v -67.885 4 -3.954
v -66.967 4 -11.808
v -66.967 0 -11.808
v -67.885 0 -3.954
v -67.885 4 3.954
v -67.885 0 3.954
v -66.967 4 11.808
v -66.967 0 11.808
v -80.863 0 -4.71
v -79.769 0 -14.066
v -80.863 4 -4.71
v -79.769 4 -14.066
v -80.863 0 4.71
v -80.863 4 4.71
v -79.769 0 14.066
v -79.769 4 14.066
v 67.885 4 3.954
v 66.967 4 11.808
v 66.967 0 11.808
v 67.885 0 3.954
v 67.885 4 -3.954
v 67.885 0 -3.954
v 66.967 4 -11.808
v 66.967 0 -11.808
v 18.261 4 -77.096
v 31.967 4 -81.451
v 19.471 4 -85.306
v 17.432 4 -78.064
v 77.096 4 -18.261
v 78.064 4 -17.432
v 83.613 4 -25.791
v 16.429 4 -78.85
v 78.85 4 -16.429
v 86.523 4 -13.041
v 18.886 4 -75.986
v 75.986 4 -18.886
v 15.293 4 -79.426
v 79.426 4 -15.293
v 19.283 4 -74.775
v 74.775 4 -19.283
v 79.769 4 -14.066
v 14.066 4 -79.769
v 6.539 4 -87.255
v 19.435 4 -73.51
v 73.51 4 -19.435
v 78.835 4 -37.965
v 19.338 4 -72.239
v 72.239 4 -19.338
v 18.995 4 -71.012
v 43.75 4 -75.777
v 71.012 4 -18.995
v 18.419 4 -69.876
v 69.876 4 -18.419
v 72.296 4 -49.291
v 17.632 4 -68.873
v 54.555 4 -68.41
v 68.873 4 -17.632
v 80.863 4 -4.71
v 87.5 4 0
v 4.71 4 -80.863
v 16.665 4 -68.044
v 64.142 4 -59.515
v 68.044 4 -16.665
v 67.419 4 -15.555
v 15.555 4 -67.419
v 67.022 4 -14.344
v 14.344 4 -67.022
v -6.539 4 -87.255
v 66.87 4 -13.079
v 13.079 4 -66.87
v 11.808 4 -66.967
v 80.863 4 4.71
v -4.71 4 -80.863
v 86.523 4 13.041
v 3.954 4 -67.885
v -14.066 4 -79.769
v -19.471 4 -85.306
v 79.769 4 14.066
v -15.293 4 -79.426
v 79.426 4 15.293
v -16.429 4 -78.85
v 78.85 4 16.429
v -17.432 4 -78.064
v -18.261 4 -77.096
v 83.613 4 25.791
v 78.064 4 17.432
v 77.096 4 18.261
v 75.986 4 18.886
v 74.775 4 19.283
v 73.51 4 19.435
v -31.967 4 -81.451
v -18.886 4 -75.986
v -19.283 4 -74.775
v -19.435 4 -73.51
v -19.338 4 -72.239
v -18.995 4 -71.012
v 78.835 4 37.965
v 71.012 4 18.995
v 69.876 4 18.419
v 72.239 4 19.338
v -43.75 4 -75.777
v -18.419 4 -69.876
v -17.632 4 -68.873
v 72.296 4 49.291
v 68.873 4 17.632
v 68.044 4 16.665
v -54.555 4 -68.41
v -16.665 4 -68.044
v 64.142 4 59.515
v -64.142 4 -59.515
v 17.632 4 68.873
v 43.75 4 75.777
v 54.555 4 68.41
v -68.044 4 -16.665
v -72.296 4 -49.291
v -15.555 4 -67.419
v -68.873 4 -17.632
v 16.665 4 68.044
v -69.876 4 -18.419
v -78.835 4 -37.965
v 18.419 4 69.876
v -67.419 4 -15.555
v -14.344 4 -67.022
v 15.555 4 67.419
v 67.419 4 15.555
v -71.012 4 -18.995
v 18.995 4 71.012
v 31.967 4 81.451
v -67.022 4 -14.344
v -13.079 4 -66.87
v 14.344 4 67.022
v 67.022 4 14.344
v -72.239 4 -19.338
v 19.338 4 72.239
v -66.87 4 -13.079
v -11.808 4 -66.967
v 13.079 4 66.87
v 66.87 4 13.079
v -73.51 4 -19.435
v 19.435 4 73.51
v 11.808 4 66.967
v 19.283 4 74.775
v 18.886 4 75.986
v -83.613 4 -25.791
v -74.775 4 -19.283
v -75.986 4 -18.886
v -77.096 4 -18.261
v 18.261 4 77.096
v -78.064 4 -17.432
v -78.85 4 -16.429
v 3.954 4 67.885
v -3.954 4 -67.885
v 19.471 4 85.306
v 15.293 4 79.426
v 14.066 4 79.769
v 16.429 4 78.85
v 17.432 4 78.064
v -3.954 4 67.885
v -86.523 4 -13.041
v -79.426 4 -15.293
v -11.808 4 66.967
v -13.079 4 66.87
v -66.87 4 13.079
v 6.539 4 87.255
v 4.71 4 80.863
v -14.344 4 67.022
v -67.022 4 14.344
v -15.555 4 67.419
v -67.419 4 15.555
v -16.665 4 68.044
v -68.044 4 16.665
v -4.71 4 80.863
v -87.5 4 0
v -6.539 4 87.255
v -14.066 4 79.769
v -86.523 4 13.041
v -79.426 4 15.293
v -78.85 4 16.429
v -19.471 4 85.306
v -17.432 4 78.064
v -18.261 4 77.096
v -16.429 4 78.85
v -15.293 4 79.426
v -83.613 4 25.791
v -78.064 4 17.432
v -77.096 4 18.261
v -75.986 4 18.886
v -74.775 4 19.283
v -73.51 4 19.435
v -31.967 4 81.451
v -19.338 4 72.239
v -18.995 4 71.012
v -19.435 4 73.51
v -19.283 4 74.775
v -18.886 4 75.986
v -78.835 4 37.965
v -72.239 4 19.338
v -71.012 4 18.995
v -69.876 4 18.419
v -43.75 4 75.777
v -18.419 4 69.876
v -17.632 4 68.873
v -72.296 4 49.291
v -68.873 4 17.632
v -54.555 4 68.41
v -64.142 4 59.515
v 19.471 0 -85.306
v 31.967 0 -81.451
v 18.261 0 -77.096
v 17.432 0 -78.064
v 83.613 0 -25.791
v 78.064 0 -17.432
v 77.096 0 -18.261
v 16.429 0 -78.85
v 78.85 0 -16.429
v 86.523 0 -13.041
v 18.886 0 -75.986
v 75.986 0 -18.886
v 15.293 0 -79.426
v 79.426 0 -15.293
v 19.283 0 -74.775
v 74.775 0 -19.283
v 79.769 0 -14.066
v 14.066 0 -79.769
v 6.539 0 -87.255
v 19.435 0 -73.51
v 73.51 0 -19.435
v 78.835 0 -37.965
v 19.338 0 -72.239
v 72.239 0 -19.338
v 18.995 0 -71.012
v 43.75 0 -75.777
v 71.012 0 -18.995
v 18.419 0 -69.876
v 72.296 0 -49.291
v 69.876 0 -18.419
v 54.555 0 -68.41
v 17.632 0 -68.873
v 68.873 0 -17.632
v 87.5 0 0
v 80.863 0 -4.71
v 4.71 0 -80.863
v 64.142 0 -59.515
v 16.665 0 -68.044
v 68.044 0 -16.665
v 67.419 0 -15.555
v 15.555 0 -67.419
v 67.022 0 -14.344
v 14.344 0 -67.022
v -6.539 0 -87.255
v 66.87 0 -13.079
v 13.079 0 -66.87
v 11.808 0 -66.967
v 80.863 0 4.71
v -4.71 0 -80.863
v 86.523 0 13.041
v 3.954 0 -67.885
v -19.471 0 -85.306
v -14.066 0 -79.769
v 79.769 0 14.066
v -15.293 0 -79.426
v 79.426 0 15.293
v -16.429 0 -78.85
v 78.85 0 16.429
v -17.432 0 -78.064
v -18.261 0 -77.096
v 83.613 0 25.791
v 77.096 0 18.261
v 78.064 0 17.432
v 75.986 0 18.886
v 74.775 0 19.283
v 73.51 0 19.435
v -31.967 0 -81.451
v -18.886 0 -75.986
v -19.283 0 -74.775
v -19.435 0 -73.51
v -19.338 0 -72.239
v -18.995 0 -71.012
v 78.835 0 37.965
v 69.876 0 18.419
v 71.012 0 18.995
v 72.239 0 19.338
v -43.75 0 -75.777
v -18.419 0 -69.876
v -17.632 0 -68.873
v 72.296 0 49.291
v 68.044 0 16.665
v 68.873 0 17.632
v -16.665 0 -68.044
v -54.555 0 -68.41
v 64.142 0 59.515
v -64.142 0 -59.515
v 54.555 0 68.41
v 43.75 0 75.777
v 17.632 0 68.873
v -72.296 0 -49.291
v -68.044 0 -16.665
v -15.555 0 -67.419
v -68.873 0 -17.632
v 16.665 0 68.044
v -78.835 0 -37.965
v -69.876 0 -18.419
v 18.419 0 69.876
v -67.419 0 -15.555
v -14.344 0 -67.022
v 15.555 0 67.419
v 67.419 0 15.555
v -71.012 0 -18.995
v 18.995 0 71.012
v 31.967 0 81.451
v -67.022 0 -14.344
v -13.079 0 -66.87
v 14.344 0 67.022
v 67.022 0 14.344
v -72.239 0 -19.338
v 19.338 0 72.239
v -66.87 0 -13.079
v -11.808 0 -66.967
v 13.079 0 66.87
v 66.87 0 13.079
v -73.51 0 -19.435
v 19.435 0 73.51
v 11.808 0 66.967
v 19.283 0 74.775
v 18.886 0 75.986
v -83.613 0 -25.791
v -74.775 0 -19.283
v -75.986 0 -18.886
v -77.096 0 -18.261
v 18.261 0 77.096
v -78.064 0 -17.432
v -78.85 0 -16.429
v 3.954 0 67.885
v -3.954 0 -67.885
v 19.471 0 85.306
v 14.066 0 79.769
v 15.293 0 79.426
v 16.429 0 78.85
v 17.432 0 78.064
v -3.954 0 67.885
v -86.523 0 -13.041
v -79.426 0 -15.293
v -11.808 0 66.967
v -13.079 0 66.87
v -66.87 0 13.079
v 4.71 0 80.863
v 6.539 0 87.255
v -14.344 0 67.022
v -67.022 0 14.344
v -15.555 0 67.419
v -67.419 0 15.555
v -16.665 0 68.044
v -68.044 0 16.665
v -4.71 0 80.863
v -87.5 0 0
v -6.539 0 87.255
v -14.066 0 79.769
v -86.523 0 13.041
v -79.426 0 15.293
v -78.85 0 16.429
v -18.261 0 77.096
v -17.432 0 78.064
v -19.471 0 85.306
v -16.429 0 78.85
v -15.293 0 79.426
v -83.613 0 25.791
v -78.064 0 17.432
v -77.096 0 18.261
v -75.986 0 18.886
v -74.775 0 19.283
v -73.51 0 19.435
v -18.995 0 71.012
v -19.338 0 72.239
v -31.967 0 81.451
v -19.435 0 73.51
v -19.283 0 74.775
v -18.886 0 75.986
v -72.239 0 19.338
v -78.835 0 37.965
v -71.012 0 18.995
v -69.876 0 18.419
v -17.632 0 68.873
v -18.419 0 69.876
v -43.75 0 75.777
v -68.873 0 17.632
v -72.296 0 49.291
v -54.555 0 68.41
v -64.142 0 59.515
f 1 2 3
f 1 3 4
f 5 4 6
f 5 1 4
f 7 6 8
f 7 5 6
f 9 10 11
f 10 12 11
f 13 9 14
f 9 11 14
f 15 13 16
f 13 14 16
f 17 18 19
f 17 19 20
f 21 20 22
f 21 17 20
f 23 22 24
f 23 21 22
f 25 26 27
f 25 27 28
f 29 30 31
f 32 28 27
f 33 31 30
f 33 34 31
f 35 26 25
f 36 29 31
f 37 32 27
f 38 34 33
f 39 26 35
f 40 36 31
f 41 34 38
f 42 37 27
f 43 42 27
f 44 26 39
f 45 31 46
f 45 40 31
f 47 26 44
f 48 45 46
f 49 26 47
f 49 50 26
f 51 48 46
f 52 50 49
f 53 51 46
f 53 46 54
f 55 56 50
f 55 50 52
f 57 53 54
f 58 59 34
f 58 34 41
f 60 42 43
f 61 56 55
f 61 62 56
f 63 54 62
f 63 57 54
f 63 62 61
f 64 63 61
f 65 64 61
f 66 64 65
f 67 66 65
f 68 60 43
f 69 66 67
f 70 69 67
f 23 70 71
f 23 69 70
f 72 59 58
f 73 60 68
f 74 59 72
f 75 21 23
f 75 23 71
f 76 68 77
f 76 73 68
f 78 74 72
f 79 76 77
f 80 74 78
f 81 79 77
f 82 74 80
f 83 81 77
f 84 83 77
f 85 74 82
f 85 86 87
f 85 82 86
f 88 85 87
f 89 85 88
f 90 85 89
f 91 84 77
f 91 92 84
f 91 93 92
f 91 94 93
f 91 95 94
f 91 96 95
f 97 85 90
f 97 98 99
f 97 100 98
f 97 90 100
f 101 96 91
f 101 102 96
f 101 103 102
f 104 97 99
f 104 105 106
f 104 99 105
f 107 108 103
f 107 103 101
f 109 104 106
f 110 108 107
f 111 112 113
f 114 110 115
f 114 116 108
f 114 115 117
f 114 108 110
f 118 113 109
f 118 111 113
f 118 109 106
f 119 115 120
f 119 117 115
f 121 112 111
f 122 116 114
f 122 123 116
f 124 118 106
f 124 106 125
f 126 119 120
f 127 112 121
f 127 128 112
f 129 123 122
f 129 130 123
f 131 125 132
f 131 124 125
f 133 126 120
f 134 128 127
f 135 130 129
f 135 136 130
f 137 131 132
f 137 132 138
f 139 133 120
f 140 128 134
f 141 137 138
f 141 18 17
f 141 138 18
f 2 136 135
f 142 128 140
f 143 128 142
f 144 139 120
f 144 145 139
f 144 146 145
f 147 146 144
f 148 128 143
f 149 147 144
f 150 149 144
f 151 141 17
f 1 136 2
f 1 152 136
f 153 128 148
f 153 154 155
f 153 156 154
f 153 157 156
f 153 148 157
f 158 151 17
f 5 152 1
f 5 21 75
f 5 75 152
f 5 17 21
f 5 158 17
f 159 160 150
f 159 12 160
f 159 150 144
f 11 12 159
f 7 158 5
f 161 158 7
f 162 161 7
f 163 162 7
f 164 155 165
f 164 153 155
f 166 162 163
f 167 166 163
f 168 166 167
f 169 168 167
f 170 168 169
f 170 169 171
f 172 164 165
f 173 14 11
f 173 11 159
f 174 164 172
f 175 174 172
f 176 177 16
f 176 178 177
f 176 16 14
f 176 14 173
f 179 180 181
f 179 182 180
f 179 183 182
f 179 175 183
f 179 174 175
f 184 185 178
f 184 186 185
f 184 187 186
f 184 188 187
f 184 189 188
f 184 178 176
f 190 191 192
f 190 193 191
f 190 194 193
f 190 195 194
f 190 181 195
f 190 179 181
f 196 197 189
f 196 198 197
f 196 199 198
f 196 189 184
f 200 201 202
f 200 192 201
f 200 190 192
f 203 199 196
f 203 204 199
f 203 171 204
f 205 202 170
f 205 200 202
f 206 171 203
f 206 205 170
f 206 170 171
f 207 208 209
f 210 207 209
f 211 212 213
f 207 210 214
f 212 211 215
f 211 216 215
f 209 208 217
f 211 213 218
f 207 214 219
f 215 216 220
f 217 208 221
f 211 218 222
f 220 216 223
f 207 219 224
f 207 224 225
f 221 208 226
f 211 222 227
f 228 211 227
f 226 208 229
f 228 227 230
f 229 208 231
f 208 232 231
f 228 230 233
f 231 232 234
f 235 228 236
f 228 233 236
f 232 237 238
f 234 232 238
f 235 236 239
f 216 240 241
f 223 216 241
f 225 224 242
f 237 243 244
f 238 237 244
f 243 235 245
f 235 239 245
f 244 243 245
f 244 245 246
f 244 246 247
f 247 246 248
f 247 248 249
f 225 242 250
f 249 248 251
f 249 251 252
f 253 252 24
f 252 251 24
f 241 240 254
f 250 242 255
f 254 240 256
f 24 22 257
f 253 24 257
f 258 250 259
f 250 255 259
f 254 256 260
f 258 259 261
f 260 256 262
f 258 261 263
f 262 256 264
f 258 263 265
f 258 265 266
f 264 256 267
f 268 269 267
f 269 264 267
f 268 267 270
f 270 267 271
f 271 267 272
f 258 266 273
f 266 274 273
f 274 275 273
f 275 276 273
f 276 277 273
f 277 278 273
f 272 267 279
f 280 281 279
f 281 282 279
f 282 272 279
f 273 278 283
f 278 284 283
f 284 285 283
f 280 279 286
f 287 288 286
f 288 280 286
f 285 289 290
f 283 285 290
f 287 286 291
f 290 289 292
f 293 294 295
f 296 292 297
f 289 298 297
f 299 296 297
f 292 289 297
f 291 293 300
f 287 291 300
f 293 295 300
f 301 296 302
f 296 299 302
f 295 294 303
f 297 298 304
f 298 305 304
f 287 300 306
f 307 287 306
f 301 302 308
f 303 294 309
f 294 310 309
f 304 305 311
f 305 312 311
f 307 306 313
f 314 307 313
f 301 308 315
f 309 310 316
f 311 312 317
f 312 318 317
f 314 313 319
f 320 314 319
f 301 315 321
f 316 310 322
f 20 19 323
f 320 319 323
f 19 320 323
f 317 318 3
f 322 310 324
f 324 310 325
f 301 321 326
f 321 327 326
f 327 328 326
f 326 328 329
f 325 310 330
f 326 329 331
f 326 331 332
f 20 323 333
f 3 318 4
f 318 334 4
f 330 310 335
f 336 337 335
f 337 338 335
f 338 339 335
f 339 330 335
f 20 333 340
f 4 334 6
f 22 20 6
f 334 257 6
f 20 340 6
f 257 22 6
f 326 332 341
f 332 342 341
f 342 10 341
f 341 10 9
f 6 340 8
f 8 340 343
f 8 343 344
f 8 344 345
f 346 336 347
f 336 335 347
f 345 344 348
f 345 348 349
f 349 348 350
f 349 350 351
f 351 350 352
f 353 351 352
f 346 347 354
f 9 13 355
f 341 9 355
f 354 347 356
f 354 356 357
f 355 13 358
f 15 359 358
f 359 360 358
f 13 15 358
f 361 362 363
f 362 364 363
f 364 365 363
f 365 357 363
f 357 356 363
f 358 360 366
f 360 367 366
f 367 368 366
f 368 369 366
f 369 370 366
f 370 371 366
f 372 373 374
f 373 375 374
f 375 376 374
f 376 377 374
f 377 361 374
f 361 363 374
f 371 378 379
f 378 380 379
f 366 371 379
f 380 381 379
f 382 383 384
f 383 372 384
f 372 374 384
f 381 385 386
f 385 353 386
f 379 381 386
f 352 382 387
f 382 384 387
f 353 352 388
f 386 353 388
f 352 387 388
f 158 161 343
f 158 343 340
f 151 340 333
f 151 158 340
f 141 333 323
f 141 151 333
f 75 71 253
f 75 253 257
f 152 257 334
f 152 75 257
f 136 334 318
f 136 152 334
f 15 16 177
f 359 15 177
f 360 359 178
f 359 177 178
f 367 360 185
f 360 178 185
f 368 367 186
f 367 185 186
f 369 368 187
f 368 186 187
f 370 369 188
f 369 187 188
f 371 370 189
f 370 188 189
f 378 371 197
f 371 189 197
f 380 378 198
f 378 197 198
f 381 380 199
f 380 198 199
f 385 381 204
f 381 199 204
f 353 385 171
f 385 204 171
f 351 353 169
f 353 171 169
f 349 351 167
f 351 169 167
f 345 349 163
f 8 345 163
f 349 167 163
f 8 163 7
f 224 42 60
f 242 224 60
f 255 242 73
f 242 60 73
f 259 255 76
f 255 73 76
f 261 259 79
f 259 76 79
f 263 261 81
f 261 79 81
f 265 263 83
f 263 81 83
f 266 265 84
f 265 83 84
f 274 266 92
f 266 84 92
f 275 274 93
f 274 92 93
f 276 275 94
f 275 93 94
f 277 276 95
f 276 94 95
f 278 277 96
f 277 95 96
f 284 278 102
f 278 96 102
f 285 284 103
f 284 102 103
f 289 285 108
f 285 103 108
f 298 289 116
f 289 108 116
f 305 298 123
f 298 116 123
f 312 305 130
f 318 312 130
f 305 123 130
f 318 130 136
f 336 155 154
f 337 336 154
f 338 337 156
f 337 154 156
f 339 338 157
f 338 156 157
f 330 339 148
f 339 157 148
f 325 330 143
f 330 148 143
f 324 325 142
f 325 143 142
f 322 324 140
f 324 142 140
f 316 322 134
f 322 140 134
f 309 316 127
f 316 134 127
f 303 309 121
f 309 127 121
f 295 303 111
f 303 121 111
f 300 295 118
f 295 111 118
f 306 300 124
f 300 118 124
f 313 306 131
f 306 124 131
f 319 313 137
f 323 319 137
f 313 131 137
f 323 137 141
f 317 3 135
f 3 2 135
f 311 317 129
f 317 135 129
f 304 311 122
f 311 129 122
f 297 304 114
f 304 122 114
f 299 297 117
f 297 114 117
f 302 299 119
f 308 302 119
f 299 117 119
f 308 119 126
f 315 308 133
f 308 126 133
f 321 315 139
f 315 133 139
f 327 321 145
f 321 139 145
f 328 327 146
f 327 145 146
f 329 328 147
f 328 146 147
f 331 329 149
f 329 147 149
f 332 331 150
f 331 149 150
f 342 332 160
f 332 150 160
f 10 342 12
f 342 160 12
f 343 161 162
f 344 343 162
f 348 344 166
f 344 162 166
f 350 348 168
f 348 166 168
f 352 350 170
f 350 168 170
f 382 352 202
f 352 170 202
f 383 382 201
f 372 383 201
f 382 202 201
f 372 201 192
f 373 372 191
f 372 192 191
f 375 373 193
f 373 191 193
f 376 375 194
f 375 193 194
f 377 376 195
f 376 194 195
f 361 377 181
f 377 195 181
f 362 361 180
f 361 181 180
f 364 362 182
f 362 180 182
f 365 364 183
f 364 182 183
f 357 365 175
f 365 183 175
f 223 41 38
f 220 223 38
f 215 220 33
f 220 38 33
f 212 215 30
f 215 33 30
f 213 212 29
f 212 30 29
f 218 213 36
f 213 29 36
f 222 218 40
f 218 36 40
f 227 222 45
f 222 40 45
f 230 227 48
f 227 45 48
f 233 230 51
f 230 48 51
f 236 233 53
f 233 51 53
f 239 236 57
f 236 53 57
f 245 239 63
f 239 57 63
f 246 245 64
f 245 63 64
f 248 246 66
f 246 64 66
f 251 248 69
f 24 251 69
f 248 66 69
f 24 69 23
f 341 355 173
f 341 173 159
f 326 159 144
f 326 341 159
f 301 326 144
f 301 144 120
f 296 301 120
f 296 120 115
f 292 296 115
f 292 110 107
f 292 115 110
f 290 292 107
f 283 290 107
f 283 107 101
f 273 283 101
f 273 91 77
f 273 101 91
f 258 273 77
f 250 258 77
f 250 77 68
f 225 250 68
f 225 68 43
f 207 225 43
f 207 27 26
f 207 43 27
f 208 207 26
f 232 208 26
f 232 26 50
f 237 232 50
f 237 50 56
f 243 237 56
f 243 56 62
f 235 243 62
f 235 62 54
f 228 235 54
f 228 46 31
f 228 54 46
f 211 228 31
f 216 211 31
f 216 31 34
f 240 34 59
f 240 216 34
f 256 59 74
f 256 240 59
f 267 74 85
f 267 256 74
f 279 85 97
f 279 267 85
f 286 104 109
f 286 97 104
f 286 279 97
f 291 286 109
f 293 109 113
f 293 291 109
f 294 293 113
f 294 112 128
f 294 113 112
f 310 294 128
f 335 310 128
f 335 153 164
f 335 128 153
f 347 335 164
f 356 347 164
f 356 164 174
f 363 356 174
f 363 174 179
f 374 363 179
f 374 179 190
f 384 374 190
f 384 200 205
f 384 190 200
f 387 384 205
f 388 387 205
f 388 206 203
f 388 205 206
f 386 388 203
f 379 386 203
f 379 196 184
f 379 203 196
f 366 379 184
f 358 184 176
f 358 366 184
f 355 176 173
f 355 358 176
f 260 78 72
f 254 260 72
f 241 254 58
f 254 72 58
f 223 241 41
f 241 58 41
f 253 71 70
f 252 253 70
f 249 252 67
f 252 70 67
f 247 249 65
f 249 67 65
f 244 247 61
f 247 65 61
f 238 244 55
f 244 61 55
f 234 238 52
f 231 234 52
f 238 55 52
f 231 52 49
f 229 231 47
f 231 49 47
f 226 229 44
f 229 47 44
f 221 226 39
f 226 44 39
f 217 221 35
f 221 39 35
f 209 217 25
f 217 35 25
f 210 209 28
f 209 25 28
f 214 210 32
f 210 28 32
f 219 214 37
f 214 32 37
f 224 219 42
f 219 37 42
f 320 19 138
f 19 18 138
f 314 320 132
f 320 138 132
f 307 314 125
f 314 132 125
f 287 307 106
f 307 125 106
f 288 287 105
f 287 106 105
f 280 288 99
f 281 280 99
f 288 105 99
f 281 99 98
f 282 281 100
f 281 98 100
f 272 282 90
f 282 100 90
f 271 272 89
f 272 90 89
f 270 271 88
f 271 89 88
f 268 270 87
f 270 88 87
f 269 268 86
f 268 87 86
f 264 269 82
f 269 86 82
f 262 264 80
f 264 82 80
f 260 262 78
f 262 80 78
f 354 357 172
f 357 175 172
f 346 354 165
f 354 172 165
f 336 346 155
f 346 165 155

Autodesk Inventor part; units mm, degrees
ref_plane "YZ Plane" through (0, 0, 0) normal (1, 0, 0) x (0, 1, 0)
ref_plane "XZ Plane" through (0, 0, 0) normal (0, 1, 0) x (-1, 0, 0)
ref_plane "XY Plane" through (0, 0, 0) normal (0, 0, 1) x (1, 0, 0)
sketch "Sketch1" plane through (0, 0, 0) normal (0, 1, 0) x (-1, 0, 0)
  circle A0 centre (0, 0) radius 87.5
  dimension "d0" = 175
extrude "Plate1" add sketch "Sketch1" along normal blind 4
sketch "Sketch2" plane through (0, 4, 0) normal (0, 1, 0) x (1, 0, 0)
  circle A0 centre (0, 0) radius 87.5 projected
  arc A1 (73.3682, -12.9368) -> (73.3682, 12.9368) centre (0, 0) ccw construction
  arc A2 (79.7694, -14.0655) -> (79.7694, 14.0655) centre (0, 0) ccw
  arc A3 (66.9669, -11.8081) -> (66.9669, 11.8081) centre (0, 0) ccw
  arc A4 (66.9669, -11.8081) -> (79.7694, -14.0655) centre (73.3682, -12.9368) ccw
  arc A5 (79.7694, 14.0655) -> (66.9669, 11.8081) centre (73.3682, 12.9368) ccw
  point P0 (74.5, 0)
  dimension "d19" = 13
  dimension "d20" = 20
  dimension "d21" = 74.5
extrude "Extrusion1" cut sketch "Sketch2" against normal through all contours A4 A3 A5 A2
pattern_circular "Circular Pattern1" count 4 over 360 about axis through (0, -10, 0) along (0, 1, 0) of "Extrusion1"
sketch "Sketch3" plane through (0, 4, 0) normal (0, 1, 0) x (1, 0, 0)
  line L0 (40.5, 40.5) -> (-40.5, 40.5)
  line L1 (-40.5, 40.5) -> (-40.5, -40.5)
  line L2 (-40.5, -40.5) -> (40.5, -40.5)
  line L3 (40.5, -40.5) -> (40.5, 40.5)
  line L4 (40.5, 40.5) -> (-40.5, -40.5) construction
  line L5 (-40.5, 40.5) -> (40.5, -40.5) construction
  point P0 (0, 0)
  dimension "d22" = 81
mark "Mark1"
equation "\"d1\" = Thickness"
equation "\"BendReliefWidth\" = Thickness"
equation "\"BendReliefDepth\" = 0.5 * Thickness"
equation "\"CornerReliefSize\" = 4 * Thickness"
equation "\"MinimumRemnant\" = 2 * Thickness"
equation "\"TransitionRadius\" = BendRadius"
equation "\"JacobiRadiusSize\" = BendRadius"
equation "\"GapSize\" = Thickness"
equation "\"Thickness\" = 4"
equation "\"BendRadius\" = 6"
properties part number "MSC 906 FLANGE FRAME" material "Stainless Steel"
